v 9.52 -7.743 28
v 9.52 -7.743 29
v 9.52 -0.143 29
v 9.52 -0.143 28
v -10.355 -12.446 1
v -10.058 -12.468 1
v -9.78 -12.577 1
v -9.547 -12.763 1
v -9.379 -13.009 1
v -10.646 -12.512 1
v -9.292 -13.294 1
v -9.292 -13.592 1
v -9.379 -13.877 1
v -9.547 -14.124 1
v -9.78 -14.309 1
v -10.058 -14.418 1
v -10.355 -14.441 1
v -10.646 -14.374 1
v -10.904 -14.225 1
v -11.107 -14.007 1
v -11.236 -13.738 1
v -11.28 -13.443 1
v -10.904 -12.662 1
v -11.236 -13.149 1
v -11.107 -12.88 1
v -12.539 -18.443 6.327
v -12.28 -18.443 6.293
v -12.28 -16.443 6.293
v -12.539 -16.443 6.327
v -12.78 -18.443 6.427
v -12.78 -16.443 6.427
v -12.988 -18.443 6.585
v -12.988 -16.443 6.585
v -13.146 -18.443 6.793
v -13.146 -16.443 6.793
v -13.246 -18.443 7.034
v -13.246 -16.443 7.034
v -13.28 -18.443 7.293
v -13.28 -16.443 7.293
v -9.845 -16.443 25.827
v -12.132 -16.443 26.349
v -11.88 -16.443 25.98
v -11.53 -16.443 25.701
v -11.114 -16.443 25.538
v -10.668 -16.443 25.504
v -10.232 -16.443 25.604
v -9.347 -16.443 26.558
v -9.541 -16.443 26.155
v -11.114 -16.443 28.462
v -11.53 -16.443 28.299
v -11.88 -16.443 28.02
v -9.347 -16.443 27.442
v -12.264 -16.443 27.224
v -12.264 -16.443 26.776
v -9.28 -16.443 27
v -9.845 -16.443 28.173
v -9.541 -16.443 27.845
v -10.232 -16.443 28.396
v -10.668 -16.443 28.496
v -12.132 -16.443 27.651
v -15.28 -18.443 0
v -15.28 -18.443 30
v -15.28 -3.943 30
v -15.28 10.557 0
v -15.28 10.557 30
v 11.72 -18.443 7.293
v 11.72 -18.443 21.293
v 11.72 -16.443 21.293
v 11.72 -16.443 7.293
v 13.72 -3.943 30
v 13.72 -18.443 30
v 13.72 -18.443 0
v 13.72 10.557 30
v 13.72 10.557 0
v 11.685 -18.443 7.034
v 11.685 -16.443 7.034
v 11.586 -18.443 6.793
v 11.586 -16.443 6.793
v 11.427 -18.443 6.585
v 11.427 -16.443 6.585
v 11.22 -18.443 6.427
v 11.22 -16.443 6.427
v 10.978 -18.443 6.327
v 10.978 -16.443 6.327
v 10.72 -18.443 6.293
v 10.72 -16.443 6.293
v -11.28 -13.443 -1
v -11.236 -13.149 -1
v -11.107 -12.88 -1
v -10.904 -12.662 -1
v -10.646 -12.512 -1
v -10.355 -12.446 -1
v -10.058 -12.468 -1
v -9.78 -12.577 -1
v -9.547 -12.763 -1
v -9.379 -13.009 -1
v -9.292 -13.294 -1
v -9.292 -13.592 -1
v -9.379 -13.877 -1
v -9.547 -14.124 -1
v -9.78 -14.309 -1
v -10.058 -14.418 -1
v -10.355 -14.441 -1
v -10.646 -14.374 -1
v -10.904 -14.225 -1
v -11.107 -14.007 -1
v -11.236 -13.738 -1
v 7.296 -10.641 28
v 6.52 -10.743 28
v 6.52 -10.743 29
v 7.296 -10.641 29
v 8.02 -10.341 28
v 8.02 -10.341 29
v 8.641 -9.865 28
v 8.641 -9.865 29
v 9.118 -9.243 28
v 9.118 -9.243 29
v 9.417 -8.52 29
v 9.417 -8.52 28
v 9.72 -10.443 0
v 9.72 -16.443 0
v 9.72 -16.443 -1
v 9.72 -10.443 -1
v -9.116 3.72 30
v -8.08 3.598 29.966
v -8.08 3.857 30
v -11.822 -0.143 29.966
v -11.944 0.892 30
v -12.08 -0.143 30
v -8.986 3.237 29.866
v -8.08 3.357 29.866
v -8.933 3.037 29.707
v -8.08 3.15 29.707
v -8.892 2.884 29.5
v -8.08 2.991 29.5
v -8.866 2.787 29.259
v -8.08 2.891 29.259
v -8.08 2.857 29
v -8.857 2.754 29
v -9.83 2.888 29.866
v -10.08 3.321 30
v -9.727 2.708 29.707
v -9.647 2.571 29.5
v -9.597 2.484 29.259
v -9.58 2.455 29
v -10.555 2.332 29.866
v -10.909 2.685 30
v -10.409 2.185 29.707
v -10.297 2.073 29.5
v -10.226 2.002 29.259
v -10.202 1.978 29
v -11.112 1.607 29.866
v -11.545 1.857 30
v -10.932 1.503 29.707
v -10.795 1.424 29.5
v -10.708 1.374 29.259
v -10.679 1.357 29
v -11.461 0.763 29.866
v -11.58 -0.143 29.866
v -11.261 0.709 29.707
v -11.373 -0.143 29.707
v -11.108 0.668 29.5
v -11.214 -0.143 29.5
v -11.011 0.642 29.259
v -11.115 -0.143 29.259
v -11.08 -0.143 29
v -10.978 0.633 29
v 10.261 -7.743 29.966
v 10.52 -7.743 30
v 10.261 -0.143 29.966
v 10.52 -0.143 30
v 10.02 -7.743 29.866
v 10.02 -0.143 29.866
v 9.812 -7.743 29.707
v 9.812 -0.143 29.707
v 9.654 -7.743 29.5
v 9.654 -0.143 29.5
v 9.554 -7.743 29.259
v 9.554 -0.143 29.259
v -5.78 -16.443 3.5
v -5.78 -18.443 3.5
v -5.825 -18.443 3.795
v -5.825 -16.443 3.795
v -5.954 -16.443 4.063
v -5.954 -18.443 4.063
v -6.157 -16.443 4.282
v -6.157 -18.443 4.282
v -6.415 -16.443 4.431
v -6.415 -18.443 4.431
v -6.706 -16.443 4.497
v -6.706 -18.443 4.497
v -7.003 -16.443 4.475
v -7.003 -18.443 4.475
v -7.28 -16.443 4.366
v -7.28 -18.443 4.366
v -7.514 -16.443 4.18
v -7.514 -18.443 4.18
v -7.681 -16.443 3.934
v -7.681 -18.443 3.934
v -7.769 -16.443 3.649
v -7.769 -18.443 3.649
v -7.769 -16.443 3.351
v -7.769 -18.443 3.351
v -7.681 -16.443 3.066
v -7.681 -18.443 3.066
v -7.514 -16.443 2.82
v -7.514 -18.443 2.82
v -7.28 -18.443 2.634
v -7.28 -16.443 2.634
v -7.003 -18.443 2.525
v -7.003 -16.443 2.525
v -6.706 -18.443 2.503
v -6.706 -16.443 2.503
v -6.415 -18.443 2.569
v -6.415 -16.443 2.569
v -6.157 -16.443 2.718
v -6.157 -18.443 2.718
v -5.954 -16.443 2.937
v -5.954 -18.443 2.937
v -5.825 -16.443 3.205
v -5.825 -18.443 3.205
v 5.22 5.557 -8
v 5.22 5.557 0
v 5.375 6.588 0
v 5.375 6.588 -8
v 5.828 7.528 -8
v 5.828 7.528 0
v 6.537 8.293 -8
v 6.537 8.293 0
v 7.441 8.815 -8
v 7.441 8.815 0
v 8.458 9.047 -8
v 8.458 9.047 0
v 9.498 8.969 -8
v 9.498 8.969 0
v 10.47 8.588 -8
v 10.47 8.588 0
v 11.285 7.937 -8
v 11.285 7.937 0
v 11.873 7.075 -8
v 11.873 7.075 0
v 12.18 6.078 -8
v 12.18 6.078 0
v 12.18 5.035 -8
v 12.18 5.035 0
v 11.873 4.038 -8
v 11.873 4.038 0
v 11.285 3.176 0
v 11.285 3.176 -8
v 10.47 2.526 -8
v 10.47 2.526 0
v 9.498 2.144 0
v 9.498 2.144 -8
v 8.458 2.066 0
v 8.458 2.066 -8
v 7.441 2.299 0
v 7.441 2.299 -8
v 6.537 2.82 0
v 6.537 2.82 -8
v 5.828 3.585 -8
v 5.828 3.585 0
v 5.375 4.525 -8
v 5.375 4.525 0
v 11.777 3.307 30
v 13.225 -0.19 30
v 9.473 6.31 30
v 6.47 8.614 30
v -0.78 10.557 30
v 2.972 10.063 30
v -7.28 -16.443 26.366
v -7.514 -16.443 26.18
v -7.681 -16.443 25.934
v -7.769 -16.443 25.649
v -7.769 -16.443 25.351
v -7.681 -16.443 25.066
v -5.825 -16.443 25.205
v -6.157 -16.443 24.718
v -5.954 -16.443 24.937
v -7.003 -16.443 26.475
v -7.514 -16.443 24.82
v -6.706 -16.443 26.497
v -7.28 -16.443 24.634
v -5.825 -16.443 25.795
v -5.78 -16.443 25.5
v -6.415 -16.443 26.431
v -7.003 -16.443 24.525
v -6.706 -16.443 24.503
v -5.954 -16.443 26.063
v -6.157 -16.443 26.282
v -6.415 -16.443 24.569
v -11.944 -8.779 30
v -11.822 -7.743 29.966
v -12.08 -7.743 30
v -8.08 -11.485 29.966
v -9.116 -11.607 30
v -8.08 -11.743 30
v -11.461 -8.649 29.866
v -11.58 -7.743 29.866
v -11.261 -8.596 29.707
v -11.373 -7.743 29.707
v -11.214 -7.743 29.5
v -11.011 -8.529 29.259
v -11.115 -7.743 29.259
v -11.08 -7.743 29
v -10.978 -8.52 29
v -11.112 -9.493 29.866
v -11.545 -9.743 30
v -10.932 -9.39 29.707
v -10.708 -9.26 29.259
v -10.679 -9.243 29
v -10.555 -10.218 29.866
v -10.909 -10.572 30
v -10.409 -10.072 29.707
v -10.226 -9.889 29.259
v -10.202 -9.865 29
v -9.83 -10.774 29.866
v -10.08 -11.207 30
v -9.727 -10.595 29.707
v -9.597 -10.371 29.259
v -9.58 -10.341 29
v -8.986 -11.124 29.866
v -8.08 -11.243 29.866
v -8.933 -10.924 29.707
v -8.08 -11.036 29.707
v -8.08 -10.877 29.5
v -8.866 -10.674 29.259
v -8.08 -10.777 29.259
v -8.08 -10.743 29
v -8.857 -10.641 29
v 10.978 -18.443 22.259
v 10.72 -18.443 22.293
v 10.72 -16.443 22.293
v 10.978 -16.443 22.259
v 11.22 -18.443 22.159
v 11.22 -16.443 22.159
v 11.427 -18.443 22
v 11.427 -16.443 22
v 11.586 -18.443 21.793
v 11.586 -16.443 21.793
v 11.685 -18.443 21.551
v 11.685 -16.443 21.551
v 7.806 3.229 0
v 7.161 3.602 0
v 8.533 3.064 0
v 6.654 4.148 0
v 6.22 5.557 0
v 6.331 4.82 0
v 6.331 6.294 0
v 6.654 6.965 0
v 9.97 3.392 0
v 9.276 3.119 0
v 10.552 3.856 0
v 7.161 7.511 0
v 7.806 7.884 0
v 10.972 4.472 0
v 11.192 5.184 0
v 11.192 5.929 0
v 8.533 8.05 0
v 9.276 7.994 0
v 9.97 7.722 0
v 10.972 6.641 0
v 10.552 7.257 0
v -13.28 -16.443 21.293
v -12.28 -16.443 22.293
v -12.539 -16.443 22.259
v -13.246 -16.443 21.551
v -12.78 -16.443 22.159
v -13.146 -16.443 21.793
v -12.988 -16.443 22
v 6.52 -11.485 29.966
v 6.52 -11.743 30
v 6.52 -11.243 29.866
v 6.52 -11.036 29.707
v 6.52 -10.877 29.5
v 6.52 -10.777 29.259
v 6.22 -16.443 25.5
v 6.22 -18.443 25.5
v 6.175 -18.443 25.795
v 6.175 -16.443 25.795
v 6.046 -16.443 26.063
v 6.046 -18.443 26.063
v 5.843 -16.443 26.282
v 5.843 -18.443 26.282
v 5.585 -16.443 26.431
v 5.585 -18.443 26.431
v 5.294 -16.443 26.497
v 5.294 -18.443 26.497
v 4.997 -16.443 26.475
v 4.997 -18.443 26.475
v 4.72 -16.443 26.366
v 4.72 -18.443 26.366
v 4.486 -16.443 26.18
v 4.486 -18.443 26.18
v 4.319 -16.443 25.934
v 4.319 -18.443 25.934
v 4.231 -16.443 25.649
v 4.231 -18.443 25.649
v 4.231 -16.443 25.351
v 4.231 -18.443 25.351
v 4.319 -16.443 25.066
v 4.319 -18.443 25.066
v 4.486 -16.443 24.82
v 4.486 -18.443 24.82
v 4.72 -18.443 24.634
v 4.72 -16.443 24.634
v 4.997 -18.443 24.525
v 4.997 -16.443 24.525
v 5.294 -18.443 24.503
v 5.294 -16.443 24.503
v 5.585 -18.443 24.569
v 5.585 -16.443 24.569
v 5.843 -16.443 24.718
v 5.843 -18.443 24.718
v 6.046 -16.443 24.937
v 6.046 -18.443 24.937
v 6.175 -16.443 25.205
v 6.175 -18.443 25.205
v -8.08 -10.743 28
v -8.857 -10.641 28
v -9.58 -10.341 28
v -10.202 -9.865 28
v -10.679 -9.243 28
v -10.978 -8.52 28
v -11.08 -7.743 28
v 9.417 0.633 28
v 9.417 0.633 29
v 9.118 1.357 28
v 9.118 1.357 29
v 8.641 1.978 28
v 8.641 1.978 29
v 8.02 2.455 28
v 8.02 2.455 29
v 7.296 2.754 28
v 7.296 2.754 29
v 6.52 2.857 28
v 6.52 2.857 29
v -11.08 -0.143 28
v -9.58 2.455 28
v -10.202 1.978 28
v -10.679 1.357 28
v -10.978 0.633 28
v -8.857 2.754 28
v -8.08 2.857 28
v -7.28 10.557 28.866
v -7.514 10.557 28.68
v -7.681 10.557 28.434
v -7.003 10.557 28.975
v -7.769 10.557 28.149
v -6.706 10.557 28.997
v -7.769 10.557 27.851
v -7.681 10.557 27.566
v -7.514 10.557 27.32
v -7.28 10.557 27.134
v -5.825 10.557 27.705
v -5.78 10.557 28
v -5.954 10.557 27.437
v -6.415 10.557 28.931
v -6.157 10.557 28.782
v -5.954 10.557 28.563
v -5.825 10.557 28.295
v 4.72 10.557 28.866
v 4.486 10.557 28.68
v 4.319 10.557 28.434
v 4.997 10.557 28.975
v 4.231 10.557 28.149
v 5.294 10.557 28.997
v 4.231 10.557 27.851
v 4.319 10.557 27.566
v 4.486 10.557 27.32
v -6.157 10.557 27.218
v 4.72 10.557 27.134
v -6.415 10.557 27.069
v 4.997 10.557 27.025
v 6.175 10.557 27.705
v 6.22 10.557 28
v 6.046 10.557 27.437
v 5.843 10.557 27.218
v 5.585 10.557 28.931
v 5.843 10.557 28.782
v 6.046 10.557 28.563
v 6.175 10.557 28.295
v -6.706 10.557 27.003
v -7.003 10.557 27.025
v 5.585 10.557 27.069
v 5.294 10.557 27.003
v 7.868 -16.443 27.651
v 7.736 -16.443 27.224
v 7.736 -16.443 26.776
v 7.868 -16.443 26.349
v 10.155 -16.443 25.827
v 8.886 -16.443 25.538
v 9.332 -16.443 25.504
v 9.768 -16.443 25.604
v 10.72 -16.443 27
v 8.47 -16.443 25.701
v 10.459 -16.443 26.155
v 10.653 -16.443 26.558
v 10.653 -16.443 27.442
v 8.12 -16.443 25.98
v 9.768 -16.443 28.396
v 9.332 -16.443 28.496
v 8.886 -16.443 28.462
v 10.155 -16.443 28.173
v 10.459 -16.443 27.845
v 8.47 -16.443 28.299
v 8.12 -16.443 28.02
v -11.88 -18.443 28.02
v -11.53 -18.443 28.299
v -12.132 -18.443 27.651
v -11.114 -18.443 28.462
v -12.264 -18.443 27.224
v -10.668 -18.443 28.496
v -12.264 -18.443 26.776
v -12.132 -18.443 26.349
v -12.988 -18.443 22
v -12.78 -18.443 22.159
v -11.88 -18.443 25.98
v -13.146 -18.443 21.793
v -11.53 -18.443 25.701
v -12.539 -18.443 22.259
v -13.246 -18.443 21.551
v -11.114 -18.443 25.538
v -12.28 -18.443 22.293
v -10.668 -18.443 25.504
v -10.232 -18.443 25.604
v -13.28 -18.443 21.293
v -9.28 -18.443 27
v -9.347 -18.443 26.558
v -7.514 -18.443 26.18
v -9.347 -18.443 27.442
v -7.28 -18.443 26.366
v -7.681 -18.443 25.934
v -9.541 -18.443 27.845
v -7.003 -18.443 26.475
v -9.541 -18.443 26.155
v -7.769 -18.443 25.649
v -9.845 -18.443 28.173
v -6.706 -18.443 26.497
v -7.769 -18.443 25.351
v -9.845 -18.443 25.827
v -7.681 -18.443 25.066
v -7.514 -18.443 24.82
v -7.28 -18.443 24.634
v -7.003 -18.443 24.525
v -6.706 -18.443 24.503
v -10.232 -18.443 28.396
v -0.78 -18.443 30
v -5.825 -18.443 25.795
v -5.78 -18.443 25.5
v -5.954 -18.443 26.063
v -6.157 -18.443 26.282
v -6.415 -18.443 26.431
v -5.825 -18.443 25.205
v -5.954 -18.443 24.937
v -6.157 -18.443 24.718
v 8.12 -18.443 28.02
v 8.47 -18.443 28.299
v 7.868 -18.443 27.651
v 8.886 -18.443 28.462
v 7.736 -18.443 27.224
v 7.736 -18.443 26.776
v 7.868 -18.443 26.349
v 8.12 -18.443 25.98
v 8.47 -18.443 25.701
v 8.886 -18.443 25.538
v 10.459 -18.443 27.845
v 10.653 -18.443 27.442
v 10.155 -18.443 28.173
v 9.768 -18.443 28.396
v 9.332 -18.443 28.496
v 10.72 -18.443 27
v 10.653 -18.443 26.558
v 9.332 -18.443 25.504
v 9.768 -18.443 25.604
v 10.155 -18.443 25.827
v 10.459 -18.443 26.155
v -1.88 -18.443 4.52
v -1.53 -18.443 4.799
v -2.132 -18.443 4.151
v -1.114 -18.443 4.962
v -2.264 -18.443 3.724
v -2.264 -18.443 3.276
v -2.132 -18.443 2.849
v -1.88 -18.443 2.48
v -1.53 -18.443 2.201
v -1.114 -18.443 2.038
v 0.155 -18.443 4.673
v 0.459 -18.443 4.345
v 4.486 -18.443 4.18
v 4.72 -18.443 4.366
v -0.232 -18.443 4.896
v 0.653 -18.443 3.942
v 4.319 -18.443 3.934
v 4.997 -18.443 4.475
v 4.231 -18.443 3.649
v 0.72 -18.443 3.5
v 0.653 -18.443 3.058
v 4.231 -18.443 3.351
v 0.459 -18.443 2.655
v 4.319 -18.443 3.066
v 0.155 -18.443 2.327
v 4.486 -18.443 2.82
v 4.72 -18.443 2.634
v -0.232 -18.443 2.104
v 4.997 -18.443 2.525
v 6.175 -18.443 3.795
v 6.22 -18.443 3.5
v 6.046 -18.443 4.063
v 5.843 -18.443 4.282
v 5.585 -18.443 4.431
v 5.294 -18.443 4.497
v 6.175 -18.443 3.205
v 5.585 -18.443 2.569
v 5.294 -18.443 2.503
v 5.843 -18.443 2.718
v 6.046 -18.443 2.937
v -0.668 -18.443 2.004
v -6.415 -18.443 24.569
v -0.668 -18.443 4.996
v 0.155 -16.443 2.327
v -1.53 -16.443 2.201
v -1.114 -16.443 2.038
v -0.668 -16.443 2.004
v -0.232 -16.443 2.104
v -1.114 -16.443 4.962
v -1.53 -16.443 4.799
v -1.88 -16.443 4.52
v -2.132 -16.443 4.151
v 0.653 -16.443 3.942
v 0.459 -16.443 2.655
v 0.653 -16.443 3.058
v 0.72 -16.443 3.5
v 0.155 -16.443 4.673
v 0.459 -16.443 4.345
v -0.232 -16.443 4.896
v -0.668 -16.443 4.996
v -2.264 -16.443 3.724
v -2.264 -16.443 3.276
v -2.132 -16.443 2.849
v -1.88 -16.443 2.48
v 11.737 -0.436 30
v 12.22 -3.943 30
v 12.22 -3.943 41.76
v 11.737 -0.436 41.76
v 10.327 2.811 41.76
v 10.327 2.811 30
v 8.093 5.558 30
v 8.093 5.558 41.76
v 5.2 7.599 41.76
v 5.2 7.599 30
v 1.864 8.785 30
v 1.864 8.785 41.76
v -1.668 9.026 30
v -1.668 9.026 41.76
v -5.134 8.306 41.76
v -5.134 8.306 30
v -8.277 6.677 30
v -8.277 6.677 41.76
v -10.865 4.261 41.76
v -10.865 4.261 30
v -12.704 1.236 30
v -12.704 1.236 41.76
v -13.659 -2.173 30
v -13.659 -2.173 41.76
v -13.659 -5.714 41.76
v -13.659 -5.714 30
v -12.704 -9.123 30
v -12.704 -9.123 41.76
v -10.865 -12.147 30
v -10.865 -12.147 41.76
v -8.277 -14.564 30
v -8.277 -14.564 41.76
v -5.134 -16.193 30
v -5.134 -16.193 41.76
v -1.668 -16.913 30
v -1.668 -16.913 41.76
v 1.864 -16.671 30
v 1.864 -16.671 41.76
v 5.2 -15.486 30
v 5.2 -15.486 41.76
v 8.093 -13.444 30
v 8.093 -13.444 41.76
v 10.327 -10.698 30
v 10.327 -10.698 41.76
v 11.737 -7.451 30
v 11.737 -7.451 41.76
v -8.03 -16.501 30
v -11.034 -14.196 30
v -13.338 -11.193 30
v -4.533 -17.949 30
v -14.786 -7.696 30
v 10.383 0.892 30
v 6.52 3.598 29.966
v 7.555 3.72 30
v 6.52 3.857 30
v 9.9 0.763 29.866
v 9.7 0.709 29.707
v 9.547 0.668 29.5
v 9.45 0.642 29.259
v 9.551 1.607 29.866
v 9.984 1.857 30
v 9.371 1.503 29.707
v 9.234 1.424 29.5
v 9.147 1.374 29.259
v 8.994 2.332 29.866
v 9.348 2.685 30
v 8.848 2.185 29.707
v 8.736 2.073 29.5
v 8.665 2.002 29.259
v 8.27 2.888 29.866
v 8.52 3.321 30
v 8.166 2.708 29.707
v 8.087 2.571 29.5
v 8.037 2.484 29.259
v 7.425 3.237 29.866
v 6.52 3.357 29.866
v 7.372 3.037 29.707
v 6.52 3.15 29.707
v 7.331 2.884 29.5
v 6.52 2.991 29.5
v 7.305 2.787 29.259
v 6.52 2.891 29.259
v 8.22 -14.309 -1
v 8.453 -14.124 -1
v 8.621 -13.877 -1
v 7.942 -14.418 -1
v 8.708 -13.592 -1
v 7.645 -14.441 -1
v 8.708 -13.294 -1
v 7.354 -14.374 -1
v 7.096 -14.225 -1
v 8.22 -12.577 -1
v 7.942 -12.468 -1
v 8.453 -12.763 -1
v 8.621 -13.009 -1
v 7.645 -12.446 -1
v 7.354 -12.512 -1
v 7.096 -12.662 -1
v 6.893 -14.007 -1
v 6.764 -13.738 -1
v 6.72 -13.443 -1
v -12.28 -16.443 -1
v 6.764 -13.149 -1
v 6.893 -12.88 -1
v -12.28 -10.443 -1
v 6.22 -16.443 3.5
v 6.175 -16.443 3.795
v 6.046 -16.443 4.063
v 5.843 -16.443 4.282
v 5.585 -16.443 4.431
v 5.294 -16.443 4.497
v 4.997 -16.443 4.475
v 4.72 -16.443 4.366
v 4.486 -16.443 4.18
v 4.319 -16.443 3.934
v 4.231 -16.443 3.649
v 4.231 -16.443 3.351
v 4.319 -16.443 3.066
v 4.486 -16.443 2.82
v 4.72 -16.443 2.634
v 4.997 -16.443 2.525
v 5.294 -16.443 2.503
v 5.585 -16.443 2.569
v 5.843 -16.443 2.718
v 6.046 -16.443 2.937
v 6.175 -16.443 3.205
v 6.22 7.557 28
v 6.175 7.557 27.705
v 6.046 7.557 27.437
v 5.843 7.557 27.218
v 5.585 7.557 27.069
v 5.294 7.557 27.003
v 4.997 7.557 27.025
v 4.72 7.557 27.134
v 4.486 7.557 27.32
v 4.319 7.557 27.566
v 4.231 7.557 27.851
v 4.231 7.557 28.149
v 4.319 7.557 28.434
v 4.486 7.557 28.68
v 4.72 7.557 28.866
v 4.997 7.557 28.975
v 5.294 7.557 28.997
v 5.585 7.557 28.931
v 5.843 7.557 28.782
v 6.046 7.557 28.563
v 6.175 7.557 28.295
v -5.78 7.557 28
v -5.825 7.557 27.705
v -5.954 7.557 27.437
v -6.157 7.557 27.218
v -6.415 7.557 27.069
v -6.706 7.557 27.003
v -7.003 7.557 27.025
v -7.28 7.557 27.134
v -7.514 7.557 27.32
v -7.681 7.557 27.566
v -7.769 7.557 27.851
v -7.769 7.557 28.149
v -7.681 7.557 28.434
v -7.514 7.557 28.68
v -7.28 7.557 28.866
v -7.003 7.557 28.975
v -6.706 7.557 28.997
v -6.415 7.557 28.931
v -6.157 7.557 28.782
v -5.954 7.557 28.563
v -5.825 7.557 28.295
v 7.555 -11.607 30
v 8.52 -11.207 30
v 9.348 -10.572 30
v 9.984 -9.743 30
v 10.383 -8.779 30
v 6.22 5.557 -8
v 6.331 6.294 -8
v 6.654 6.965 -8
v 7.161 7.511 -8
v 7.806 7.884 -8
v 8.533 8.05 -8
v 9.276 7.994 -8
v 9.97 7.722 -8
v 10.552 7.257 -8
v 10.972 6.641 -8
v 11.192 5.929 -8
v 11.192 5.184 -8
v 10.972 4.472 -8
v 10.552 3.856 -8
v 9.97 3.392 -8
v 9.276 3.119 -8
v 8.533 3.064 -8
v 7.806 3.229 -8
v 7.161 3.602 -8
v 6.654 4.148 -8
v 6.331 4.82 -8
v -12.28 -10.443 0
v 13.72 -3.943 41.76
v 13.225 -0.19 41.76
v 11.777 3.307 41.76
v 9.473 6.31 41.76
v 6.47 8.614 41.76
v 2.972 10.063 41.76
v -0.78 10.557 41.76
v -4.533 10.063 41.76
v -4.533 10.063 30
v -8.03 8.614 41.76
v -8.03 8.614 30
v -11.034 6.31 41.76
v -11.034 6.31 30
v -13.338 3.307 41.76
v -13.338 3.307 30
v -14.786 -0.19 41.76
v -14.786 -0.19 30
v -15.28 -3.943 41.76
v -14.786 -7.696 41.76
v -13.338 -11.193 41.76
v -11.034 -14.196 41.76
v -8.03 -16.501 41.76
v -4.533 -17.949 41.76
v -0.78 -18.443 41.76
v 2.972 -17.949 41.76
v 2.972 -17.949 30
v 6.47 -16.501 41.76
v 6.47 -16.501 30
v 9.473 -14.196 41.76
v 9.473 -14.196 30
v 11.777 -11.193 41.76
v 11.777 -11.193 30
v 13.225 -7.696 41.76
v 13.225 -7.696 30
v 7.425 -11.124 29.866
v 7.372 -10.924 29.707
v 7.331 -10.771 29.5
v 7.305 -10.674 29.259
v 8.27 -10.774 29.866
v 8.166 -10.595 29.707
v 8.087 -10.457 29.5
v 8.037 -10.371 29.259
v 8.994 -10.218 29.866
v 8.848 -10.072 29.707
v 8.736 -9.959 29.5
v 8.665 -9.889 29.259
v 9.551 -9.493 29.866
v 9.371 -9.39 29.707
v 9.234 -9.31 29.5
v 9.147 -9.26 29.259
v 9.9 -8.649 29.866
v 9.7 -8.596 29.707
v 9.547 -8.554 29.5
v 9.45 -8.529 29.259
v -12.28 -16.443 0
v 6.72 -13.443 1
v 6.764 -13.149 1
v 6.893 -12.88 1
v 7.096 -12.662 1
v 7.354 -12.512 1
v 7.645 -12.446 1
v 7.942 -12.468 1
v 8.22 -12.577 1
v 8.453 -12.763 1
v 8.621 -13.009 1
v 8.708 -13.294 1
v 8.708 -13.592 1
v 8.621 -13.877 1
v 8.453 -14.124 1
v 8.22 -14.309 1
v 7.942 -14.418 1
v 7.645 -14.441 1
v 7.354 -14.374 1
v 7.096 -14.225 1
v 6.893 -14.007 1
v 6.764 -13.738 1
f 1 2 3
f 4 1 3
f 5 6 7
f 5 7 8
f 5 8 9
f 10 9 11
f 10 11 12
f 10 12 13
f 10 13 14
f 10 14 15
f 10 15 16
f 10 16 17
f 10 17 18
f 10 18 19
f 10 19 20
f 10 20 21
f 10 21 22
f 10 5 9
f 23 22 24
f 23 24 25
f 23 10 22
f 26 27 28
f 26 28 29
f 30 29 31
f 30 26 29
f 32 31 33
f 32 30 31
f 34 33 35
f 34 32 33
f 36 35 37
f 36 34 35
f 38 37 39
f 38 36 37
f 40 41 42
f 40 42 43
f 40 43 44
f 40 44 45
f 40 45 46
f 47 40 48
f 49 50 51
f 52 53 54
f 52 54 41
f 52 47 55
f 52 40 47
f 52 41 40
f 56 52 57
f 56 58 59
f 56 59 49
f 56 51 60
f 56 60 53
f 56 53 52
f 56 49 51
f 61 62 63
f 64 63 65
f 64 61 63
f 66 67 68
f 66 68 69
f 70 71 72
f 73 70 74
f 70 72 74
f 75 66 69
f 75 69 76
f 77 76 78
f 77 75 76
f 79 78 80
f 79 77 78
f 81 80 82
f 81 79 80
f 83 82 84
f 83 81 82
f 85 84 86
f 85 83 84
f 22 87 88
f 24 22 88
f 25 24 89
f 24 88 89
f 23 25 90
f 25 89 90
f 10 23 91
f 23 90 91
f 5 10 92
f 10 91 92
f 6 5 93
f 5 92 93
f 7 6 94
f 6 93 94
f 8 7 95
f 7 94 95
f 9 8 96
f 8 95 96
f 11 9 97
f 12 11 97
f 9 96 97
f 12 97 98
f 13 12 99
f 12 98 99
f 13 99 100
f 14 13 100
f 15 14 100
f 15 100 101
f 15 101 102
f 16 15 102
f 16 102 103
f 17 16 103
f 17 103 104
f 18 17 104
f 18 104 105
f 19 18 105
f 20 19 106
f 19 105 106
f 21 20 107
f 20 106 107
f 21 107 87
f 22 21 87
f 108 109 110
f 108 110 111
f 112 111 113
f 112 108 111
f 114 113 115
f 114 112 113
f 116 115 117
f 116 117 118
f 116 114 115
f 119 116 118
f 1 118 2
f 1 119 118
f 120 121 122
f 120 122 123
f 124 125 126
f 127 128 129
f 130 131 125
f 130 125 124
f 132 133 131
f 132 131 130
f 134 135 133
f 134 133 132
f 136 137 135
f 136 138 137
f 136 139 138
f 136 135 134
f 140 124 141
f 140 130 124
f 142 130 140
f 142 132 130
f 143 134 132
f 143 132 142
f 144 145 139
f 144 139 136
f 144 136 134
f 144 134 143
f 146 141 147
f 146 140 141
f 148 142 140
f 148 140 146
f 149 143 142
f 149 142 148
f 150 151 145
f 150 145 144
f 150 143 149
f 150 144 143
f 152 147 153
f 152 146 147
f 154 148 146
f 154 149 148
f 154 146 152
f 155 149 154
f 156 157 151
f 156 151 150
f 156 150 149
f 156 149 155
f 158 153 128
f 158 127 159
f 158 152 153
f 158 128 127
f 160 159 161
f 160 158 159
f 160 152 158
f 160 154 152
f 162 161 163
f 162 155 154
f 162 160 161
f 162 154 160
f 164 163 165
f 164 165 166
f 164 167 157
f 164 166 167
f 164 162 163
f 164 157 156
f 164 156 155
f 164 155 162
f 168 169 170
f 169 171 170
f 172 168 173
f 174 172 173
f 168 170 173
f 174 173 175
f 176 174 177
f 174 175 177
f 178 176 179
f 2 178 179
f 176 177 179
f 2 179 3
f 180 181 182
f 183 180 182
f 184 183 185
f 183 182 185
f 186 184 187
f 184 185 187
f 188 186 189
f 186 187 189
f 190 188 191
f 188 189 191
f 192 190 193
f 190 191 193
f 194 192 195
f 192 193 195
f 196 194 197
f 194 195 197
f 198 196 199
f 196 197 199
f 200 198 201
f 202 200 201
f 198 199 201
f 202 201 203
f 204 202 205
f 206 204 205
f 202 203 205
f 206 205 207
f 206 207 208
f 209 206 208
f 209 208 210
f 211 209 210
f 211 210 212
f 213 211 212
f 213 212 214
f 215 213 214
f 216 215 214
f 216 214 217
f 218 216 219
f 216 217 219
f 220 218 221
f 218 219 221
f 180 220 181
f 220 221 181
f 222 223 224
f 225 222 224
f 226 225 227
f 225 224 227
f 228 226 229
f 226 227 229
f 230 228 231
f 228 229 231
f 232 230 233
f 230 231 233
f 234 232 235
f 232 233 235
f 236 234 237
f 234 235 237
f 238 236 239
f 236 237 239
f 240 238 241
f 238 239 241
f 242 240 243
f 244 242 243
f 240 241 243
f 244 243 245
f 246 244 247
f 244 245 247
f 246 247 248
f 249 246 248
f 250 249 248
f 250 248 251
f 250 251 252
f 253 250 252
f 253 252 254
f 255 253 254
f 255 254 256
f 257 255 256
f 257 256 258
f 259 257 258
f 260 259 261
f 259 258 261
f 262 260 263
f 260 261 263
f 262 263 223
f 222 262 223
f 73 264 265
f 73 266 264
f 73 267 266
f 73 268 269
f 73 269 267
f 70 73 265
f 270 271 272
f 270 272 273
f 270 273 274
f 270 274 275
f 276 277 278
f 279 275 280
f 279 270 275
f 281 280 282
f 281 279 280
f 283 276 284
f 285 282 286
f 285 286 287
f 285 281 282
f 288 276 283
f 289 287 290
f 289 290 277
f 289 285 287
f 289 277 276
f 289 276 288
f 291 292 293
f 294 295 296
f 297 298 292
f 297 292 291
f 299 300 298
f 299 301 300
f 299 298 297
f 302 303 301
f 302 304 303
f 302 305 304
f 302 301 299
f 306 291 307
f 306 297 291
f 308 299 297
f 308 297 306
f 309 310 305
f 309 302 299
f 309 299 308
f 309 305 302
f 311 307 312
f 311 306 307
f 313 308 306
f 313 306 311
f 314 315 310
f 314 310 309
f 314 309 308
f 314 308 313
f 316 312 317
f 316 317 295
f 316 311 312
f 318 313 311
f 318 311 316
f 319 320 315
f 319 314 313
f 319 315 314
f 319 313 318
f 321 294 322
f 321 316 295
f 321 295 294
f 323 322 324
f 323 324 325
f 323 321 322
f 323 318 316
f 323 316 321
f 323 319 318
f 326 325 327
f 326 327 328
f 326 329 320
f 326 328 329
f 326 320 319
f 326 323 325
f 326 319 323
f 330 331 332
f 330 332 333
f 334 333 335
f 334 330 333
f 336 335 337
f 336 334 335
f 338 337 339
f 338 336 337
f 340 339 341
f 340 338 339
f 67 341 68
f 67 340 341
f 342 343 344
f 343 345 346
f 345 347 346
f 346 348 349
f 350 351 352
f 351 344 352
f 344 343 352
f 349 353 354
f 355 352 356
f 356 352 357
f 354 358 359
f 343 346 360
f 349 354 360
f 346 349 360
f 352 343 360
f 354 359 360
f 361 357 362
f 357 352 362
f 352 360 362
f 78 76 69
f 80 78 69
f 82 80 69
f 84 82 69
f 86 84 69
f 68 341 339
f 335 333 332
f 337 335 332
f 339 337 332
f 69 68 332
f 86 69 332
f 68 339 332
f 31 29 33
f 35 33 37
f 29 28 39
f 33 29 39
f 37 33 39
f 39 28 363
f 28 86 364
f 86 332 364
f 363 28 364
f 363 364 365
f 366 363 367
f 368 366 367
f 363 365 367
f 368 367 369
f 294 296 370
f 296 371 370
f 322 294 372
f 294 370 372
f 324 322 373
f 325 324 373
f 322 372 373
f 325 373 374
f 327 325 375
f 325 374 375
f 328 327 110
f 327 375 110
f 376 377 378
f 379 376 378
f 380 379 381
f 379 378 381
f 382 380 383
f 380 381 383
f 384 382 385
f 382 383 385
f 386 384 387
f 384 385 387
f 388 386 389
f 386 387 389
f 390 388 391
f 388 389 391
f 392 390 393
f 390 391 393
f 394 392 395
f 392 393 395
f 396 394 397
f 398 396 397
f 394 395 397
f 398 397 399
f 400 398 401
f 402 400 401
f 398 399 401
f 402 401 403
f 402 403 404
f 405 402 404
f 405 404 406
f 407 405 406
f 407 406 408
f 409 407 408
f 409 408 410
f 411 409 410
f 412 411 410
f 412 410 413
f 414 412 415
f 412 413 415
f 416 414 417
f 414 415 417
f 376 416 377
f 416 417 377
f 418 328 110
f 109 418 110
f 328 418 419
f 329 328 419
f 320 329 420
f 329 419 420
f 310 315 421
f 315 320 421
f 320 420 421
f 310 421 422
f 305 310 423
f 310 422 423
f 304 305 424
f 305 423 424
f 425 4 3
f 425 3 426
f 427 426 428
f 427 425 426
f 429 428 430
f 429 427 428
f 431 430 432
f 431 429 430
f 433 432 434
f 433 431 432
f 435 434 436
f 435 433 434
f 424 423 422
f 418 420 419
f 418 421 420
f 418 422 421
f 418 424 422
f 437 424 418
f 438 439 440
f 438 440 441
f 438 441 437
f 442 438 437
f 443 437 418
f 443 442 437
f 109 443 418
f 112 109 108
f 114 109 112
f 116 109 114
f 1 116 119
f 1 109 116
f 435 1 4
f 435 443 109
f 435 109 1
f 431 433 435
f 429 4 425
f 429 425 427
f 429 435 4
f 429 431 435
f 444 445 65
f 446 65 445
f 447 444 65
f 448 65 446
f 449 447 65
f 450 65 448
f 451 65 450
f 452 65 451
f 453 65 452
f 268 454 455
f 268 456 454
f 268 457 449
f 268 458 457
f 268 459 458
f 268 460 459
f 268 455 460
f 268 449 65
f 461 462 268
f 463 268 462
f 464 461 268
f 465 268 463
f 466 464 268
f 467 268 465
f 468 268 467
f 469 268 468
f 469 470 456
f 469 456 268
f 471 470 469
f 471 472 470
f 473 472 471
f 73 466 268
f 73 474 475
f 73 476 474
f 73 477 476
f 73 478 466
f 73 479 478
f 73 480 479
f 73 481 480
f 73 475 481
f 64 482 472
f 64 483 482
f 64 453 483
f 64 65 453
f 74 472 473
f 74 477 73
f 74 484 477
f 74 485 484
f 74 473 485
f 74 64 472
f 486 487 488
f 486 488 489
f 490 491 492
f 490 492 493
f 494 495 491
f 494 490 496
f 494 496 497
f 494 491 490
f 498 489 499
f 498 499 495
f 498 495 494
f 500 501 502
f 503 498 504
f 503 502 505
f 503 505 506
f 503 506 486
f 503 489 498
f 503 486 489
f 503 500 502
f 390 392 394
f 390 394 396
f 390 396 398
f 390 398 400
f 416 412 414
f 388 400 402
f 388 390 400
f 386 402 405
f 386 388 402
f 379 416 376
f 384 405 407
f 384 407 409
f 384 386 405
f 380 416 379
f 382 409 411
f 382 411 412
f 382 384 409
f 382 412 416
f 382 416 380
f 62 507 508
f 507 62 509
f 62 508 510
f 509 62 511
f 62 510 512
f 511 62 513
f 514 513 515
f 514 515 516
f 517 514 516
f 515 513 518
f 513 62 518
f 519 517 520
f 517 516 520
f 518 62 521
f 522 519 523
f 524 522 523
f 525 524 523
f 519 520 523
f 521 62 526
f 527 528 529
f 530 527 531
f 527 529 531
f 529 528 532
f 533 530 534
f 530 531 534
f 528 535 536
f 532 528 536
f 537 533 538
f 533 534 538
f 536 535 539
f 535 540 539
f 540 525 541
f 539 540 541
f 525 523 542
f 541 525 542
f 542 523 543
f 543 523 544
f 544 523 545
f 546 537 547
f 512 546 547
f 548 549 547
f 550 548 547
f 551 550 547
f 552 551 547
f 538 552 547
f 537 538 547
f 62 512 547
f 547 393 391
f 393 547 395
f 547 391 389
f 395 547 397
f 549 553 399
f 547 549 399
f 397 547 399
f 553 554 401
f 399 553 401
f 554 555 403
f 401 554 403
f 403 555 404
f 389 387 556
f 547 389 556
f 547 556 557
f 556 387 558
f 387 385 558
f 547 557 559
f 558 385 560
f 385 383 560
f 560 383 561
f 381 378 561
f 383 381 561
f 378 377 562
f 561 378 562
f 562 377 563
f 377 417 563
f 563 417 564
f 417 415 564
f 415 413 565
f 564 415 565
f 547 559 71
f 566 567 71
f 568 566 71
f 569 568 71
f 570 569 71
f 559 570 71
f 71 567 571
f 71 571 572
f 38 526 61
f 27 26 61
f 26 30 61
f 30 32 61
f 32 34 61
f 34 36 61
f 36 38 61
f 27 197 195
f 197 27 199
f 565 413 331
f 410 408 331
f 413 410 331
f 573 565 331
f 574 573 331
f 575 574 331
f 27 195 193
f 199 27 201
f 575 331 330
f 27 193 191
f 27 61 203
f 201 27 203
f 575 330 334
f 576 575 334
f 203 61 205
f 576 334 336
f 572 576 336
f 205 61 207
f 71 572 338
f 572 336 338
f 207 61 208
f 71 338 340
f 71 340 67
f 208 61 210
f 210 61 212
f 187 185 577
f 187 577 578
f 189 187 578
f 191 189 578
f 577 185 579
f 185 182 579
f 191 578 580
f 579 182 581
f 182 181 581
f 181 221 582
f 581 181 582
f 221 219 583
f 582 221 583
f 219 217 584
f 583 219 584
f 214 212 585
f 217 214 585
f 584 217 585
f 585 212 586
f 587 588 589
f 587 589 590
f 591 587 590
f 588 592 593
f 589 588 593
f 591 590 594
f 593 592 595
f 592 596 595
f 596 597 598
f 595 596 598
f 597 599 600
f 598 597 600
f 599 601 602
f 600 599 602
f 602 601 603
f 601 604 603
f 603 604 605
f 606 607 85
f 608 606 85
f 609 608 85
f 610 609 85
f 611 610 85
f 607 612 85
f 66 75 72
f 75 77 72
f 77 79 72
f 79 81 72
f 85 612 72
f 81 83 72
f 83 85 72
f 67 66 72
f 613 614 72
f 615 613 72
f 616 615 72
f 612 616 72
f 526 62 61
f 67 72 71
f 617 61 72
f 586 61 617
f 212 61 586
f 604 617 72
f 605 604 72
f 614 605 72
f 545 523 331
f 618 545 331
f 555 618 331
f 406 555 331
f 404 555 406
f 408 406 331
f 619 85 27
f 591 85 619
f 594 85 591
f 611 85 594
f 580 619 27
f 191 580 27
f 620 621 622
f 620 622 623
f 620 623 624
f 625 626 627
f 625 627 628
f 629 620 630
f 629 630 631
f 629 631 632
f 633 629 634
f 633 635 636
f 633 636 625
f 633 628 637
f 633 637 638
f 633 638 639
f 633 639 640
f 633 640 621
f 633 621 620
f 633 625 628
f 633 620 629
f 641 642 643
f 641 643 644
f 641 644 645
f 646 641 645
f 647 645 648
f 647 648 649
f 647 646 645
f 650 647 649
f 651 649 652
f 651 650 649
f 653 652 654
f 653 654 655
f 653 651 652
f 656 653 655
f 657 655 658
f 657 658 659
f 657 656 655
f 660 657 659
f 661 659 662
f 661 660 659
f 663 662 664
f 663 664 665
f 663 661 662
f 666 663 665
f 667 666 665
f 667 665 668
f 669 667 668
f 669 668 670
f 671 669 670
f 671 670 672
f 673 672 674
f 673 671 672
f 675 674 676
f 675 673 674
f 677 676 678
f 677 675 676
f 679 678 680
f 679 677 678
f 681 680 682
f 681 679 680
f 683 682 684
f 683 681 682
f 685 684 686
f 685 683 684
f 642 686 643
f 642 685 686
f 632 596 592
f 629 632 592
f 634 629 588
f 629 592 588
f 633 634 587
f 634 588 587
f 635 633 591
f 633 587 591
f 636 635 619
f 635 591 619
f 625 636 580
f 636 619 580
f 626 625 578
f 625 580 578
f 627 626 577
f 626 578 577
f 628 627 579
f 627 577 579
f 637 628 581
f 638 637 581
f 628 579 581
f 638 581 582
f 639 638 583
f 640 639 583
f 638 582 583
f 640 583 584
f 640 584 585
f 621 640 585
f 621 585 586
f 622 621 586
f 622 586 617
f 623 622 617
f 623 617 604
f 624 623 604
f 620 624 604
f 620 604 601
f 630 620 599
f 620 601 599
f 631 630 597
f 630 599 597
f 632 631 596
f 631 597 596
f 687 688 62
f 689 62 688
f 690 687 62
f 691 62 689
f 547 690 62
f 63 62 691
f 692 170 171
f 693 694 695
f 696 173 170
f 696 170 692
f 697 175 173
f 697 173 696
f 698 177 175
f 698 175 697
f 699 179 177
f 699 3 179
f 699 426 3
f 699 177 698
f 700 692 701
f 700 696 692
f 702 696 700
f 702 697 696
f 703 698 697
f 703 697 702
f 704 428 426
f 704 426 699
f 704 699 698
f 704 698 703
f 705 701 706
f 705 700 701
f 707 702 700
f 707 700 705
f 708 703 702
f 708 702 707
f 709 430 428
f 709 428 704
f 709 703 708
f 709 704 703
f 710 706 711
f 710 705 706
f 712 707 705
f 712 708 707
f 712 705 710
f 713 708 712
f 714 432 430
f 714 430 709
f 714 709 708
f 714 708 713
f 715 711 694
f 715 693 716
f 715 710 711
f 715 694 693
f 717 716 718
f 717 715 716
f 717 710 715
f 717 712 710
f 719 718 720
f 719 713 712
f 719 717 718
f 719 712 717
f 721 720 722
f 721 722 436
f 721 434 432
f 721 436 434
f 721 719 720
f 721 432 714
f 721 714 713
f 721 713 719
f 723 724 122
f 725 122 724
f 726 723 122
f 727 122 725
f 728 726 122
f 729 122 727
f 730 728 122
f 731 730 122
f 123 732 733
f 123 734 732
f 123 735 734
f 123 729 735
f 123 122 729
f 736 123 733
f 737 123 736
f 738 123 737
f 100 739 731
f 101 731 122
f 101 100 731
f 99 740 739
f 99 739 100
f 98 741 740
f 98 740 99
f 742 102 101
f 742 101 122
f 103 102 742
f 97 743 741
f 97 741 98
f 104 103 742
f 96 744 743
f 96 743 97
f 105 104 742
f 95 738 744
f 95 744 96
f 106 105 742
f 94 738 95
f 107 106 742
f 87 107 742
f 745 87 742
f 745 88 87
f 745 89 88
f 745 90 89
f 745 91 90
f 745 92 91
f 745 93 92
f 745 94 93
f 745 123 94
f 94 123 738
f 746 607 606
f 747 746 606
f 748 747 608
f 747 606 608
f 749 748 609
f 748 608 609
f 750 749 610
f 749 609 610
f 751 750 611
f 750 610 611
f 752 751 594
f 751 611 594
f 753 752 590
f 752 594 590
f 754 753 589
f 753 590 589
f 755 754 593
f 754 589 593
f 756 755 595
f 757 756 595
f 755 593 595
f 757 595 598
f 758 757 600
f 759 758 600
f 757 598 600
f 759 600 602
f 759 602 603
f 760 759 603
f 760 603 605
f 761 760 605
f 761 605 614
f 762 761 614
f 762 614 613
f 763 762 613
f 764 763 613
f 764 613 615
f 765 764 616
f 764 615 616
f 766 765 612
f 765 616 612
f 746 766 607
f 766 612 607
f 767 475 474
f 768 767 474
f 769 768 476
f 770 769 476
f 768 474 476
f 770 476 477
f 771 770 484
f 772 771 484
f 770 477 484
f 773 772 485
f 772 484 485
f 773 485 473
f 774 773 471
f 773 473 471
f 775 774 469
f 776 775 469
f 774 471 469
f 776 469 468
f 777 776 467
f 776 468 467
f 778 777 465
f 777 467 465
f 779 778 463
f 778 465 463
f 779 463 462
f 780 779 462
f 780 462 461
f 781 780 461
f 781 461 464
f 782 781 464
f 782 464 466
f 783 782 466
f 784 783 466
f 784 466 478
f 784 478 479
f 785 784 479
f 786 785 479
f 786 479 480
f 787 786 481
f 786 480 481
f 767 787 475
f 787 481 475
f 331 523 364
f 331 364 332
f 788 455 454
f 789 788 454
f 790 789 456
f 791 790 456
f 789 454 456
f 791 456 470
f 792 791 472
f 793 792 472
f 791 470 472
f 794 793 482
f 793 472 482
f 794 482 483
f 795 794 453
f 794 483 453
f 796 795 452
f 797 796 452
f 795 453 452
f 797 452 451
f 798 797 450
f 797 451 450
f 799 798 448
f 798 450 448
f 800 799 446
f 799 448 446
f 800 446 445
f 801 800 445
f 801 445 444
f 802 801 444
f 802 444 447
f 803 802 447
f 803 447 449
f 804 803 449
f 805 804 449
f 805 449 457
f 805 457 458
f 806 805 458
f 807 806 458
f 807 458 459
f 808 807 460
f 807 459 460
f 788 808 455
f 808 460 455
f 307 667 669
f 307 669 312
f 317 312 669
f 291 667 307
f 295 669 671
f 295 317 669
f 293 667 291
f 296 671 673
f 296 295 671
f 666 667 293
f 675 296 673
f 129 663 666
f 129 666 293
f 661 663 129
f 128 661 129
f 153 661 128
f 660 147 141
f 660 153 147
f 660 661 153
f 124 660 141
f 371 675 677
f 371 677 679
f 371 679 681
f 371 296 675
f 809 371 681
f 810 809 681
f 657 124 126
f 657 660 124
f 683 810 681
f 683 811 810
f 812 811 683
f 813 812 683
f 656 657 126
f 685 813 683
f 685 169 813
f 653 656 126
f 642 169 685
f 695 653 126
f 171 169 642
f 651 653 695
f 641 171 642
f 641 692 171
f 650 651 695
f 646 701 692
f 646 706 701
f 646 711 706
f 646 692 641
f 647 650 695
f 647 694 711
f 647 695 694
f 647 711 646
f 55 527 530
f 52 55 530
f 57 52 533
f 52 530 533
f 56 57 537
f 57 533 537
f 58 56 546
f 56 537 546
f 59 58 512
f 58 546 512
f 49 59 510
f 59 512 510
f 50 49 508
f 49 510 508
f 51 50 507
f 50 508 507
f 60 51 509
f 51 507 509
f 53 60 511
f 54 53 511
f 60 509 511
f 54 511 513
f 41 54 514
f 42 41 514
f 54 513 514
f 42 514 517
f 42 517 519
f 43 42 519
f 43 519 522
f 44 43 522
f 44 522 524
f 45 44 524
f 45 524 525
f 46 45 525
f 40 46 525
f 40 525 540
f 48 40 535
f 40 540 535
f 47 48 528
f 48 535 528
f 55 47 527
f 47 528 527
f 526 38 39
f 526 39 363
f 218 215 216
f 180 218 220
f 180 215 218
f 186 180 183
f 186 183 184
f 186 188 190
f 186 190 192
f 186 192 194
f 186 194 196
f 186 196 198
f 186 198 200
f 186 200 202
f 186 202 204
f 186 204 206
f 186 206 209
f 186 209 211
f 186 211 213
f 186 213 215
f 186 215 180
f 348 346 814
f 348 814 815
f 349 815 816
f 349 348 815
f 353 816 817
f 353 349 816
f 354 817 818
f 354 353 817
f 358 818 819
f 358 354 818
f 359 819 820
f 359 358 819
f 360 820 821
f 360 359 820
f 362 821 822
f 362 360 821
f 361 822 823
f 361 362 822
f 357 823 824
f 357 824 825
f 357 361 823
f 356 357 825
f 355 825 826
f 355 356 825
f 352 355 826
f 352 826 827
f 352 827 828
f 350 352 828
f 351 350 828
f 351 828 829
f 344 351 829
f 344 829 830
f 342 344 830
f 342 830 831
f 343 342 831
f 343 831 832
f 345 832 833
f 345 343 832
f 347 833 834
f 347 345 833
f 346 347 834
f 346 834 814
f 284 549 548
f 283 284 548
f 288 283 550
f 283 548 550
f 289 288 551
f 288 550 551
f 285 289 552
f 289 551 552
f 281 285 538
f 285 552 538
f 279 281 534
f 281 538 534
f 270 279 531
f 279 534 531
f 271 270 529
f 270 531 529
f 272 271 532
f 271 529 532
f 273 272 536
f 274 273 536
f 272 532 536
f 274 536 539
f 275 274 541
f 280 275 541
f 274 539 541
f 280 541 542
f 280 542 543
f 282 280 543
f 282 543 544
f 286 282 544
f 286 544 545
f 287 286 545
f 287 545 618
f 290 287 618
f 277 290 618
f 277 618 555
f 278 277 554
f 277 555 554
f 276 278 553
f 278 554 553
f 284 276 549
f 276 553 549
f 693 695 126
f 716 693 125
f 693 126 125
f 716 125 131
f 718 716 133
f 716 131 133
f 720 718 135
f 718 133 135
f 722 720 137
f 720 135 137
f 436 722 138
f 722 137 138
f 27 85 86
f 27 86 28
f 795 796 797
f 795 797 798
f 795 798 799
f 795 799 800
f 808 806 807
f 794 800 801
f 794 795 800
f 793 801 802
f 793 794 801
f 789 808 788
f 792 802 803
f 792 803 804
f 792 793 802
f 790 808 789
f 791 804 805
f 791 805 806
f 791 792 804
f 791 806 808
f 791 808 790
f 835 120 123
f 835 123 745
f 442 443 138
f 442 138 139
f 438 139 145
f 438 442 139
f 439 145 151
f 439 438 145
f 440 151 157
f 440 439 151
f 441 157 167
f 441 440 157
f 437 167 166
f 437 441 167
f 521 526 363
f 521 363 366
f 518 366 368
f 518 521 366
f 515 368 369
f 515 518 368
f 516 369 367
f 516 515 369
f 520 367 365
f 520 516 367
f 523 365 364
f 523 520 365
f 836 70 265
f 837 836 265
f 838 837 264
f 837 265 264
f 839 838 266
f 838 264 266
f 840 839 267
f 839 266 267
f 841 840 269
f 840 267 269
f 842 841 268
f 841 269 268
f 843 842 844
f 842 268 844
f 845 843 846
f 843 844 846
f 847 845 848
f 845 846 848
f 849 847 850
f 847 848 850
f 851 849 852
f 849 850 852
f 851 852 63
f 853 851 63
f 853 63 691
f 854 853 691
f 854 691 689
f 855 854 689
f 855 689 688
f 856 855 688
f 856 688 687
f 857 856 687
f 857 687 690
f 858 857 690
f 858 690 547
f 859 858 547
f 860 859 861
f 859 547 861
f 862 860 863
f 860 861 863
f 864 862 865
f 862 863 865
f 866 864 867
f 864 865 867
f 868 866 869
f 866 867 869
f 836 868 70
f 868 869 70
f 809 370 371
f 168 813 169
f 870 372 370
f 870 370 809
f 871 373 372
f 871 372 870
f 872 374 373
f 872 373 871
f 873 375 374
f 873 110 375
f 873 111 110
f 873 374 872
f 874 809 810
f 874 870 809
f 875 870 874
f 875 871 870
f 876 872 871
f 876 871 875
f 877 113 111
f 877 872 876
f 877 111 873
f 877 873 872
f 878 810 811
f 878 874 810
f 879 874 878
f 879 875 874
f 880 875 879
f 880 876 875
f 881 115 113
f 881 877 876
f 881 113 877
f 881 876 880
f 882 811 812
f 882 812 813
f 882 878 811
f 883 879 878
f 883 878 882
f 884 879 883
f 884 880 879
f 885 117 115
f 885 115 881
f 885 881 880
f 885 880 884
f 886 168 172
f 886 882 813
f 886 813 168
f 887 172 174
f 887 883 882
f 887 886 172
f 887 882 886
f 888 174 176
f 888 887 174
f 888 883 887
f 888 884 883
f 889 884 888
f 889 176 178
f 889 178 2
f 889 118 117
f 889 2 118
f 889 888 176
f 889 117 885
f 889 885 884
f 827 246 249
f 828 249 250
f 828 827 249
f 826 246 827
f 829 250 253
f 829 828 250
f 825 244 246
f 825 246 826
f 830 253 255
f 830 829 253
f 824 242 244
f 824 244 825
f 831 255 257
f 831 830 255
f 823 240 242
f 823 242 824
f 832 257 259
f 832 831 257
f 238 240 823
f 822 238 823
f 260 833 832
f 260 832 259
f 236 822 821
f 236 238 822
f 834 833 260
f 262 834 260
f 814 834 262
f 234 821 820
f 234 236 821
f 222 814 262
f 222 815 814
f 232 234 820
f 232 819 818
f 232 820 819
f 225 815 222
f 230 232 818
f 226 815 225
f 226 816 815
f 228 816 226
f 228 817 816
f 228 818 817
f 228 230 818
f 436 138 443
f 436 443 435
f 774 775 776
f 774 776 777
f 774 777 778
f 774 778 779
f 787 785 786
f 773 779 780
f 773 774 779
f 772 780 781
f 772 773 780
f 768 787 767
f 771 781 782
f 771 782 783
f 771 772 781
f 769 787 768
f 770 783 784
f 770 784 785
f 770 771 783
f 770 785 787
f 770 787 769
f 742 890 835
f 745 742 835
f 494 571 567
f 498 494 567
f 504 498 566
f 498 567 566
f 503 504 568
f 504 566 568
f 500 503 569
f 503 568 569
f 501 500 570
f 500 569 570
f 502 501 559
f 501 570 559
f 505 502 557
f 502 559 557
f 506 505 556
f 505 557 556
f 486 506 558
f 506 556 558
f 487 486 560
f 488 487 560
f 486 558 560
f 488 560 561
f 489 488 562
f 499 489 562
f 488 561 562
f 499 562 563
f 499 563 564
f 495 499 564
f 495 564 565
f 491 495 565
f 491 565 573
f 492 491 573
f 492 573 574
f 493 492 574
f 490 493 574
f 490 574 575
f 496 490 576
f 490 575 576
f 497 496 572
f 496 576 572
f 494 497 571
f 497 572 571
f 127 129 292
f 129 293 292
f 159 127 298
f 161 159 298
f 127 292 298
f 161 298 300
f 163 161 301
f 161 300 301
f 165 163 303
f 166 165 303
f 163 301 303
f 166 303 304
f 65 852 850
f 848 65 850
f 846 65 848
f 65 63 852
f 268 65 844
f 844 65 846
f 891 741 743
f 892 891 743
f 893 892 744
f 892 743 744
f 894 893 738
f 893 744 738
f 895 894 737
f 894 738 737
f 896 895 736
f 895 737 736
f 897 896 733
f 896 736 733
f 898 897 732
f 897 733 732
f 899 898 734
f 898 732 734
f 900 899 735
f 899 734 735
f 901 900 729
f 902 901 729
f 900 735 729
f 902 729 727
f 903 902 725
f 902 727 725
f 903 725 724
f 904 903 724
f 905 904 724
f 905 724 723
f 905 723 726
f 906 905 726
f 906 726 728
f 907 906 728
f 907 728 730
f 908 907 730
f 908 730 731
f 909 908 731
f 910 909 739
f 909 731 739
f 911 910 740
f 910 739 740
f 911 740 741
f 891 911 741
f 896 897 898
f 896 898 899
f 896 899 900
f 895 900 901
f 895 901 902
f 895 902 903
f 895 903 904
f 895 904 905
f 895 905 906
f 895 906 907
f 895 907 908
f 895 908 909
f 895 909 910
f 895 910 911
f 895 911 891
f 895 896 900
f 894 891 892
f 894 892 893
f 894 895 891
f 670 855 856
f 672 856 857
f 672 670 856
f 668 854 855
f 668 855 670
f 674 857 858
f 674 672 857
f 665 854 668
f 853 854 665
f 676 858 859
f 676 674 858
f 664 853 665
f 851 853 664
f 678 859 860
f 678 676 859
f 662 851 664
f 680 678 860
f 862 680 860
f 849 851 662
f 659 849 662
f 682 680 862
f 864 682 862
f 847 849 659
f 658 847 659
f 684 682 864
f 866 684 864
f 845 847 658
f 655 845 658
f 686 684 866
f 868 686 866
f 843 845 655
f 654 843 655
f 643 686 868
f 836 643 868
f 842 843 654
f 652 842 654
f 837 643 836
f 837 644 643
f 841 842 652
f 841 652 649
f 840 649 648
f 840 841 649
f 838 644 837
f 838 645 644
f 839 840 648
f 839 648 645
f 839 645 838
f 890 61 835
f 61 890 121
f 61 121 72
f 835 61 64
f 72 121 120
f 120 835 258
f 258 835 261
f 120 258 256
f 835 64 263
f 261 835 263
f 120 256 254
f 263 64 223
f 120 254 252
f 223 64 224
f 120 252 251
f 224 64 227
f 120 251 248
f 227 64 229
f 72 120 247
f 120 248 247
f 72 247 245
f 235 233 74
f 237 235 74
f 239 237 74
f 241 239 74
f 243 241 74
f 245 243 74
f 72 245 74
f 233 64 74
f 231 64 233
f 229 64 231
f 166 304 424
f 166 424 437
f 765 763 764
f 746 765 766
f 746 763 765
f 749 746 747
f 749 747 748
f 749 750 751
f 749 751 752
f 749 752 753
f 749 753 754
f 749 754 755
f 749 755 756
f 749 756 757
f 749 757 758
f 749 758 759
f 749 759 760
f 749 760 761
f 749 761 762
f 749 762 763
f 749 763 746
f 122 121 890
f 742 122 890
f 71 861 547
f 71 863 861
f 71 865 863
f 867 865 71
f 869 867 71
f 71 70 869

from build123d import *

# Parameters (mm, degrees)
SKETCH1_W           = 29
SKETCH1_H           = 29
BOSS_EXTRUDE1_DEPTH = 30
SKETCH2_R           = 14.5
SKETCH2_R_2         = 13
BOSS_EXTRUDE2_DEPTH = 11.76
SKETCH4_W           = 20.6
SKETCH4_H           = 13.6
CUT_EXTRUDE1_DEPTH  = 2
FILLET1_R           = 3
FILLET2_R           = 1
SKETCH5_R           = 3.5
SKETCH5_R_2         = 2.5
BOSS_EXTRUDE3_DEPTH = 8
SKETCH6_R           = 1
CUT_EXTRUDE2_DEPTH  = 3
SKETCH8_R           = 1.5
SKETCH8_R_2         = 1
CUT_EXTRUDE3_DEPTH  = 2
SKETCH9_W           = 22
SKETCH9_H           = 6
BOSS_EXTRUDE4_DEPTH = 1
SKETCH10_R          = 1
CUT_EXTRUDE4_DEPTH  = 2


with BuildPart() as part:
    # Sketch1 → Boss-Extrude1 (new body)
    with BuildSketch(Plane.XY):
        with Locations((-0.780453258, -3.943342776)):
            Rectangle(SKETCH1_W, SKETCH1_H)
    extrude(amount=BOSS_EXTRUDE1_DEPTH)

    # Sketch2 → Boss-Extrude2 (add)
    with BuildSketch(Plane.XY.offset(30)):
        with Locations((-0.780453258, -3.943342776)):
            Circle(SKETCH2_R)
        with Locations((-0.780453258, -3.943342776)):
            Circle(SKETCH2_R_2, mode=Mode.SUBTRACT)
    extrude(amount=BOSS_EXTRUDE2_DEPTH)

    # Sketch4 → Cut-Extrude1 (cut)
    with BuildSketch(Plane.XY.offset(30)):
        with Locations((-0.780453258, -3.943342776)):
            Rectangle(SKETCH4_W, SKETCH4_H)
    extrude(amount=-CUT_EXTRUDE1_DEPTH, mode=Mode.SUBTRACT)

    # Fillet1
    fillet1_edges = [part.edges().sort_by_distance(p)[0] for p in [
        (-11.080453258, -10.743342776, 29),
        (-11.080453258, 2.856657224, 29),
        (9.519546742, 2.856657224, 29),
        (9.519546742, -10.743342776, 29),
    ]]
    fillet(fillet1_edges, radius=FILLET1_R)

    # Fillet2
    fillet2_edges = [part.edges().sort_by_distance(p)[0] for p in [
        (-0.780453258, -10.743342776, 30),
        (-11.080453258, -3.943342776, 30),
        (9.519546742, -3.943342776, 30),
        (-0.780453258, 2.856657224, 30),
        (-10.201773601, -9.86466312, 30),
        (8.640867086, -9.86466312, 30),
        (8.640867086, 1.977977567, 30),
        (-10.201773601, 1.977977567, 30),
    ]]
    fillet(fillet2_edges, radius=FILLET2_R)

    # Sketch5 → Boss-Extrude3 (add)
    with BuildSketch(Plane(origin=(0, 0, 0), x_dir=(-1, 0, 0), z_dir=(0, 0, -1))):
        with Locations((-8.719546742, 5.556657224)):
            Circle(SKETCH5_R)
        with Locations((-8.719546742, 5.556657224)):
            Circle(SKETCH5_R_2, mode=Mode.SUBTRACT)
    extrude(amount=BOSS_EXTRUDE3_DEPTH)

    # Sketch6 → Cut-Extrude2 (cut)
    with BuildSketch(Plane(origin=(0, 10.556657224, 0), x_dir=(1, 0, 0), z_dir=(0, 1, 0))):
        with Locations((-6.780453258, -28)):
            Circle(SKETCH6_R)
        with Locations((5.219546742, -28)):
            Circle(SKETCH6_R)
    extrude(amount=-CUT_EXTRUDE2_DEPTH, mode=Mode.SUBTRACT)

    # Sketch8 → Cut-Extrude3 (cut)
    with BuildSketch(Plane.XZ.offset(18.443342776)):
        with Locations((9.219546742, 27)):
            Circle(SKETCH8_R)
        with Locations((-10.780453258, 27)):
            Circle(SKETCH8_R)
        with Locations((-6.780453258, 25.5)):
            Circle(SKETCH8_R_2)
        with Locations((5.219546742, 25.5)):
            Circle(SKETCH8_R_2)
        with Locations((-6.780453258, 3.5)):
            Circle(SKETCH8_R_2)
        with Locations((5.219546742, 3.5)):
            Circle(SKETCH8_R_2)
        with Locations((-0.780453258, 3.5)):
            Circle(SKETCH8_R)
        with BuildLine():
            Line((-12.280453258, 22.292576019), (10.719546742, 22.292576019))
            ThreePointArc((10.719546742, 22.292576019), (11.426653523, 21.999682801), (11.719546742, 21.292576019))
            Line((11.719546742, 21.292576019), (11.719546742, 7.292576019))
            ThreePointArc((11.719546742, 7.292576019), (11.426653523, 6.585469238), (10.719546742, 6.292576019))
            Line((10.719546742, 6.292576019), (-12.280453258, 6.292576019))
            ThreePointArc((-12.280453258, 6.292576019), (-12.987560039, 6.585469238), (-13.280453258, 7.292576019))
            Line((-13.280453258, 7.292576019), (-13.280453258, 21.292576019))
            ThreePointArc((-13.280453258, 21.292576019), (-12.987560039, 21.999682801), (-12.280453258, 22.292576019))
        make_face()
    extrude(amount=-CUT_EXTRUDE3_DEPTH, mode=Mode.SUBTRACT)

    # Sketch9 → Boss-Extrude4 (add)
    with BuildSketch(Plane(origin=(0, 0, 0), x_dir=(-1, 0, 0), z_dir=(0, 0, -1))):
        with Locations((1.280453258, -13.443342776)):
            Rectangle(SKETCH9_W, SKETCH9_H)
    extrude(amount=BOSS_EXTRUDE4_DEPTH)

    # Sketch10 → Cut-Extrude4 (cut)
    with BuildSketch(Plane(origin=(0, 0, -1), x_dir=(-1, 0, 0), z_dir=(0, 0, -1))):
        with Locations((-7.719546742, -13.443342776)):
            Circle(SKETCH10_R)
        with Locations((10.280453258, -13.443342776)):
            Circle(SKETCH10_R)
    extrude(amount=-CUT_EXTRUDE4_DEPTH, mode=Mode.SUBTRACT)


solid = part.part
